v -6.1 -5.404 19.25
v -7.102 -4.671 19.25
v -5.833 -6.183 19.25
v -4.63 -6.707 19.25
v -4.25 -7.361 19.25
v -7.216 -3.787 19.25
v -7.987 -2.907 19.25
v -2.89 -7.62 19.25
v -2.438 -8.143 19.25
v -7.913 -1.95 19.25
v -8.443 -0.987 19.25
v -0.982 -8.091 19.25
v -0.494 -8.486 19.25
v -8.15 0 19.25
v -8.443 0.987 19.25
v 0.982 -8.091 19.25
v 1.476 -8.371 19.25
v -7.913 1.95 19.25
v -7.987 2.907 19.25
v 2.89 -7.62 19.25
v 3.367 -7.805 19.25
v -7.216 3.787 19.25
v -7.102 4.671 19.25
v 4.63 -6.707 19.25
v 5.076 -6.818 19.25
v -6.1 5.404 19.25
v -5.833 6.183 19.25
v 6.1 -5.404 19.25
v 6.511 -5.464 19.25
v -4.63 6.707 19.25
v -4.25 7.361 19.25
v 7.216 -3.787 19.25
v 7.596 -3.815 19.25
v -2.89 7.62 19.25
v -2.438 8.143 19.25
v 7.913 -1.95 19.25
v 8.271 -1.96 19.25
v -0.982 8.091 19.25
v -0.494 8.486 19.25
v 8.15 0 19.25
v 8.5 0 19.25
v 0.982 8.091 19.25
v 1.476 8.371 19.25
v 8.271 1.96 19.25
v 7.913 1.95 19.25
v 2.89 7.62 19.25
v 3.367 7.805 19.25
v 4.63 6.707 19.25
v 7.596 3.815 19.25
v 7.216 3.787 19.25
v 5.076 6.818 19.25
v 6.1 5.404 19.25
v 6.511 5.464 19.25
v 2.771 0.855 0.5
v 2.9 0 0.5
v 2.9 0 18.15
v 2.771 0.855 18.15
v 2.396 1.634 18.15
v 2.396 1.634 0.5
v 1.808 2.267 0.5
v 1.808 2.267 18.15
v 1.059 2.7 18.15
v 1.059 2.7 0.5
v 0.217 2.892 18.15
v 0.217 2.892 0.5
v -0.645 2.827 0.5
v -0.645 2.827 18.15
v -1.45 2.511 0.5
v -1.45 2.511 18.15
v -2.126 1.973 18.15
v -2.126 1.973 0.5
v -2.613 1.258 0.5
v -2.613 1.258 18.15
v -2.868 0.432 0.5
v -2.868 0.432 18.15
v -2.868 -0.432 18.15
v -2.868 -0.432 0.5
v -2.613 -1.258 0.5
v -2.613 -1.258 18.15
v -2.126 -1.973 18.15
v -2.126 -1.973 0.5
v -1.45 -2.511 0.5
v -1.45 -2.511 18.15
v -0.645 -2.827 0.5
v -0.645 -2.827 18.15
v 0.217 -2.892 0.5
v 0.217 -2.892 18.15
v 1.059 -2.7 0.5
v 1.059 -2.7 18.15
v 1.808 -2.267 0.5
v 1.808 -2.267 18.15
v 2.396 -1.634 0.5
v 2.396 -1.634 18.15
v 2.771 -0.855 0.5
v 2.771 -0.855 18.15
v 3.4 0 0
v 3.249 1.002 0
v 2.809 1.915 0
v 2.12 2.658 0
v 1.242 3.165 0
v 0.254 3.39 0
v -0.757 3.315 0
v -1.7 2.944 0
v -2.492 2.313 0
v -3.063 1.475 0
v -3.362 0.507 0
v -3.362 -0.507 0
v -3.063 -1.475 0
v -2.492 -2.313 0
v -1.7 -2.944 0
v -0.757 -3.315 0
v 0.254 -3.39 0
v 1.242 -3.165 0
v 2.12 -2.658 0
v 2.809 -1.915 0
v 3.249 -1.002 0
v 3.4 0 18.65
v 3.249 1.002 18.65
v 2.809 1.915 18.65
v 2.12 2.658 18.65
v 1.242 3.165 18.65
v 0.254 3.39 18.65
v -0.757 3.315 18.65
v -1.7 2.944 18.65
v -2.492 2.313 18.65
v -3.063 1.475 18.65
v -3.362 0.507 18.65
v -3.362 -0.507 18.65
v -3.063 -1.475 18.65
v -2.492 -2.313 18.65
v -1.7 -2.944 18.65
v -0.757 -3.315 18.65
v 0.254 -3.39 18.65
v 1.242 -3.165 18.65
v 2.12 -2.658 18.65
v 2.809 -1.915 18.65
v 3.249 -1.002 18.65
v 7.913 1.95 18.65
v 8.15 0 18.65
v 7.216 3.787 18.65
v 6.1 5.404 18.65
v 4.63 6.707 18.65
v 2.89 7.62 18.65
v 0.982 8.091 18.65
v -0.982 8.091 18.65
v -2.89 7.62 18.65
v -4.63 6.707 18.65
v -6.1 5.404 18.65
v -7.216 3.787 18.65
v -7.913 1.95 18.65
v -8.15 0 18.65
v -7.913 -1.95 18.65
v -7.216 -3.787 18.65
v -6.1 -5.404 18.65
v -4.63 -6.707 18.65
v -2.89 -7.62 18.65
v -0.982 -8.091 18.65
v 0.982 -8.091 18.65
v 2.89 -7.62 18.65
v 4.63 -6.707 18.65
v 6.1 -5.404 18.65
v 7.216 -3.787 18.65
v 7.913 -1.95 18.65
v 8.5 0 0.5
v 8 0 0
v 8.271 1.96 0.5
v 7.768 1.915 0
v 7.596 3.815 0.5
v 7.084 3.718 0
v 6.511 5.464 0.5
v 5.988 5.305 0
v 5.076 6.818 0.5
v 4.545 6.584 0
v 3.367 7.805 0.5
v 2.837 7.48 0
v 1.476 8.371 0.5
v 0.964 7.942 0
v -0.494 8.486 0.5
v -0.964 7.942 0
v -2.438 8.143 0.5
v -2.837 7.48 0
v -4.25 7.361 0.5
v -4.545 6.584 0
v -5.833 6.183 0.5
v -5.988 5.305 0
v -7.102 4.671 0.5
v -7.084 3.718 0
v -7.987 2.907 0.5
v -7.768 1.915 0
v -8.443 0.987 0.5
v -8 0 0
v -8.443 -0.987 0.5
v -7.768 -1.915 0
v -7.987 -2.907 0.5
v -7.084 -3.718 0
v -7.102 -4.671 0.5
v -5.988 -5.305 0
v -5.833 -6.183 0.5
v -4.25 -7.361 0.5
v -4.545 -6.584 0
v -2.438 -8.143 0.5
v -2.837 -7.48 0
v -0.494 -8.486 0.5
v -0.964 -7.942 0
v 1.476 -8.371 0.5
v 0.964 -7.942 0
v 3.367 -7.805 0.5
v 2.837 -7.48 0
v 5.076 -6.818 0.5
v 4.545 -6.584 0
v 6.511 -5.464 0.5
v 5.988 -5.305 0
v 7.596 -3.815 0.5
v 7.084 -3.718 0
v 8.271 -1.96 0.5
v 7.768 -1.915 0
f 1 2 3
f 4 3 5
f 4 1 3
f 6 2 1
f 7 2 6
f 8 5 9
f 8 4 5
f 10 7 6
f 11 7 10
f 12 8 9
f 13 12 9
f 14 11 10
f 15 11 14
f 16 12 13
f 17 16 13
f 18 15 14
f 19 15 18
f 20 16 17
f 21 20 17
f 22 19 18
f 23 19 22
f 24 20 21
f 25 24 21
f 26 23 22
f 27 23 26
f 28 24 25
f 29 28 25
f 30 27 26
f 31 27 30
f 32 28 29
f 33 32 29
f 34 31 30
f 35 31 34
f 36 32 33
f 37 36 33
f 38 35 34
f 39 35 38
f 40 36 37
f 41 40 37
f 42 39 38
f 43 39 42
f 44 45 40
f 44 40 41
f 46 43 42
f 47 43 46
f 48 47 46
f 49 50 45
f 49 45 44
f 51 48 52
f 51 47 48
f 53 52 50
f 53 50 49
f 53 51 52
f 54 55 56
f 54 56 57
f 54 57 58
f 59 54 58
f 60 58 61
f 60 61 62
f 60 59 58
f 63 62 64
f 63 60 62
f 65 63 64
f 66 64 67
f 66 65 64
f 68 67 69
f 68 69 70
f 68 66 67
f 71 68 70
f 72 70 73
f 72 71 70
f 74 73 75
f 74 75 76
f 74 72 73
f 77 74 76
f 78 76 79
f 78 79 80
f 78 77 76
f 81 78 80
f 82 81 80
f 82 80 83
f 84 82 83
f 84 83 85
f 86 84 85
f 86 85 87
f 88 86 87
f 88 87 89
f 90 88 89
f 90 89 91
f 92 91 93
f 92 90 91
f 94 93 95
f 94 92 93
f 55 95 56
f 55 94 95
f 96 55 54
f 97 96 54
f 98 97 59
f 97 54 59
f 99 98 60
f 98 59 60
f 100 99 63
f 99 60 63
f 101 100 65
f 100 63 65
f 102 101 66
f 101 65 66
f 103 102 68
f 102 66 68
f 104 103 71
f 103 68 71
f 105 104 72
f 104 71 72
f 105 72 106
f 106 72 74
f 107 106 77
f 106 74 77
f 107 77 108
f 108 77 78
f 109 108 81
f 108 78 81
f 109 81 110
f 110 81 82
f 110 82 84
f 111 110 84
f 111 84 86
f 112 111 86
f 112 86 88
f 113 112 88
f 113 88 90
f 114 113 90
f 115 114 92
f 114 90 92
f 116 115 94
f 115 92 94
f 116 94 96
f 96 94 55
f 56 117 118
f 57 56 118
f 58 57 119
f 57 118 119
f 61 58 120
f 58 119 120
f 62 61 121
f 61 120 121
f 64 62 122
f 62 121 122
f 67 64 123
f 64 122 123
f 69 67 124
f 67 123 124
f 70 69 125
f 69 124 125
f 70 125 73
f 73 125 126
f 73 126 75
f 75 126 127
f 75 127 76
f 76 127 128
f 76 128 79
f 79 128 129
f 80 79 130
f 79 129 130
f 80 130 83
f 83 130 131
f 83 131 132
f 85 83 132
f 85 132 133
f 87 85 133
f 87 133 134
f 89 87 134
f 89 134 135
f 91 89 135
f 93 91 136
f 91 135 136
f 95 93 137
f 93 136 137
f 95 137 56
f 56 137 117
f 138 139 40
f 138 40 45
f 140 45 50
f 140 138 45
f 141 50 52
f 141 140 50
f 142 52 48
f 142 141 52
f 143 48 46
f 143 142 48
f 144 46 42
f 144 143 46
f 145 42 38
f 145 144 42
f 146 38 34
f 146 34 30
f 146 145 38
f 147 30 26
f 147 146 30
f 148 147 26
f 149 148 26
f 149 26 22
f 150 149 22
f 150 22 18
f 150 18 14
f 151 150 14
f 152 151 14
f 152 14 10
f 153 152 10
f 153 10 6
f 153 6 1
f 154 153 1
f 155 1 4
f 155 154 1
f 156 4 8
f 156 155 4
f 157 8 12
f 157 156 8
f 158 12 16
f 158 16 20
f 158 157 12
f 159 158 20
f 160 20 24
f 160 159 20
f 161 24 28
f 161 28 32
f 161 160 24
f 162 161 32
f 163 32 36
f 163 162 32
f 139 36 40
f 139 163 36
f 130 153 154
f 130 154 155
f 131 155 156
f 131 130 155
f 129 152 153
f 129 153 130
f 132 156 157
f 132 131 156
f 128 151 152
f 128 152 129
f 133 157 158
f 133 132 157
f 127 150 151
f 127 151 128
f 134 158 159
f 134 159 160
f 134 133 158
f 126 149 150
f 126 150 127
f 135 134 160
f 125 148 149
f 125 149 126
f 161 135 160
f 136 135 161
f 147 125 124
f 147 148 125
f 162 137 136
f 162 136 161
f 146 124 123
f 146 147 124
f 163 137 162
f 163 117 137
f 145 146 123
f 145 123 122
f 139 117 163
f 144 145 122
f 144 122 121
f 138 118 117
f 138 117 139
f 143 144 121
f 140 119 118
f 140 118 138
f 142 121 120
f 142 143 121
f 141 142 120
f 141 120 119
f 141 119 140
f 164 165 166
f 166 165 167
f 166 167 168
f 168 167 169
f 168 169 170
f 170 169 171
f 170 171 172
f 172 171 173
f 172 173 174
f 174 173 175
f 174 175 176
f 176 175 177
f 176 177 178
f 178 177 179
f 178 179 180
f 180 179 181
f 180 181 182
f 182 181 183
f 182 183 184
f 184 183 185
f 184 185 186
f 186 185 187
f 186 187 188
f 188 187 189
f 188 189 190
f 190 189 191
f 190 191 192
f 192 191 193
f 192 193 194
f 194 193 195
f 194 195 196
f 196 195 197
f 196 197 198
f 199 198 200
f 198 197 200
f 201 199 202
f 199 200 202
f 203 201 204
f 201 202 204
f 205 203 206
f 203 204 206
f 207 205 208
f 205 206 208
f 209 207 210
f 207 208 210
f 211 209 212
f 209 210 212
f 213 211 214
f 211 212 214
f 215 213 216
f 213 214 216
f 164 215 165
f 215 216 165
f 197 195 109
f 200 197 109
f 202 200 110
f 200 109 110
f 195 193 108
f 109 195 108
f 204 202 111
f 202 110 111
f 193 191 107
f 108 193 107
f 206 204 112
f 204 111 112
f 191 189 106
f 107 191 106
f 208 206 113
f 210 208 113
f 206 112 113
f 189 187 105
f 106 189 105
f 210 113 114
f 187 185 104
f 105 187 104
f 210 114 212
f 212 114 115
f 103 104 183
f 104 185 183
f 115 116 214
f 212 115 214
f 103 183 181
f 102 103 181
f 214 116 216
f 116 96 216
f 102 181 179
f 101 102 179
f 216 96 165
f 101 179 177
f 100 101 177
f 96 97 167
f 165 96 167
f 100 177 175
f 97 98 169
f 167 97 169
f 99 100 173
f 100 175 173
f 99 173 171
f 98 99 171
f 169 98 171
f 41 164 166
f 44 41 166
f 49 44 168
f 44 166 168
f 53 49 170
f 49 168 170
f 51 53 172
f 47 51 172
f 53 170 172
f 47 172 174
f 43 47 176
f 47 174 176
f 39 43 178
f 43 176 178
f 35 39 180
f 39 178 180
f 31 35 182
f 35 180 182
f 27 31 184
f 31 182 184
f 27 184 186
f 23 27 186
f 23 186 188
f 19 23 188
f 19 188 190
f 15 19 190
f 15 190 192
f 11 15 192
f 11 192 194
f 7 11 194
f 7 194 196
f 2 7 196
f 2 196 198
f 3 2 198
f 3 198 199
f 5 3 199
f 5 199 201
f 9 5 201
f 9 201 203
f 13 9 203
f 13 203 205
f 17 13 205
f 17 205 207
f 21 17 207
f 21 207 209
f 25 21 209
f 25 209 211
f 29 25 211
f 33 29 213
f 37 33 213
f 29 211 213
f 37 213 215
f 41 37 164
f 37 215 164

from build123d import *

# Parameters (mm, degrees)
SKIZZE1_R                       = 8.5
SKIZZE1_R_2                     = 2.9
AUFSATZ_LINEAR_AUSTRAGEN1_DEPTH = 18.65
SKIZZE2_R                       = 8.5
SKIZZE2_R_2                     = 8.15
AUFSATZ_LINEAR_AUSTRAGEN2_DEPTH = 0.6
FASE1_SIZE                      = 0.5


with BuildPart() as part:
    # Skizze1 → Aufsatz-Linear austragen1 (new body)
    with BuildSketch(Plane.XY):
        Circle(SKIZZE1_R)
        Circle(SKIZZE1_R_2, mode=Mode.SUBTRACT)
    extrude(amount=AUFSATZ_LINEAR_AUSTRAGEN1_DEPTH)

    # Skizze2 → Aufsatz-Linear austragen2 (add)
    with BuildSketch(Plane.XY.offset(18.65)):
        Circle(SKIZZE2_R)
        Circle(SKIZZE2_R_2, mode=Mode.SUBTRACT)
    extrude(amount=AUFSATZ_LINEAR_AUSTRAGEN2_DEPTH)

    # Fase1
    fase1_edges = [part.edges().sort_by_distance(p)[0] for p in [
        (-8.5, 0, 0),
        (-2.9, 0, 0),
        (-2.9, 0, 18.65),
    ]]
    chamfer(fase1_edges, length=FASE1_SIZE)


solid = part.part
